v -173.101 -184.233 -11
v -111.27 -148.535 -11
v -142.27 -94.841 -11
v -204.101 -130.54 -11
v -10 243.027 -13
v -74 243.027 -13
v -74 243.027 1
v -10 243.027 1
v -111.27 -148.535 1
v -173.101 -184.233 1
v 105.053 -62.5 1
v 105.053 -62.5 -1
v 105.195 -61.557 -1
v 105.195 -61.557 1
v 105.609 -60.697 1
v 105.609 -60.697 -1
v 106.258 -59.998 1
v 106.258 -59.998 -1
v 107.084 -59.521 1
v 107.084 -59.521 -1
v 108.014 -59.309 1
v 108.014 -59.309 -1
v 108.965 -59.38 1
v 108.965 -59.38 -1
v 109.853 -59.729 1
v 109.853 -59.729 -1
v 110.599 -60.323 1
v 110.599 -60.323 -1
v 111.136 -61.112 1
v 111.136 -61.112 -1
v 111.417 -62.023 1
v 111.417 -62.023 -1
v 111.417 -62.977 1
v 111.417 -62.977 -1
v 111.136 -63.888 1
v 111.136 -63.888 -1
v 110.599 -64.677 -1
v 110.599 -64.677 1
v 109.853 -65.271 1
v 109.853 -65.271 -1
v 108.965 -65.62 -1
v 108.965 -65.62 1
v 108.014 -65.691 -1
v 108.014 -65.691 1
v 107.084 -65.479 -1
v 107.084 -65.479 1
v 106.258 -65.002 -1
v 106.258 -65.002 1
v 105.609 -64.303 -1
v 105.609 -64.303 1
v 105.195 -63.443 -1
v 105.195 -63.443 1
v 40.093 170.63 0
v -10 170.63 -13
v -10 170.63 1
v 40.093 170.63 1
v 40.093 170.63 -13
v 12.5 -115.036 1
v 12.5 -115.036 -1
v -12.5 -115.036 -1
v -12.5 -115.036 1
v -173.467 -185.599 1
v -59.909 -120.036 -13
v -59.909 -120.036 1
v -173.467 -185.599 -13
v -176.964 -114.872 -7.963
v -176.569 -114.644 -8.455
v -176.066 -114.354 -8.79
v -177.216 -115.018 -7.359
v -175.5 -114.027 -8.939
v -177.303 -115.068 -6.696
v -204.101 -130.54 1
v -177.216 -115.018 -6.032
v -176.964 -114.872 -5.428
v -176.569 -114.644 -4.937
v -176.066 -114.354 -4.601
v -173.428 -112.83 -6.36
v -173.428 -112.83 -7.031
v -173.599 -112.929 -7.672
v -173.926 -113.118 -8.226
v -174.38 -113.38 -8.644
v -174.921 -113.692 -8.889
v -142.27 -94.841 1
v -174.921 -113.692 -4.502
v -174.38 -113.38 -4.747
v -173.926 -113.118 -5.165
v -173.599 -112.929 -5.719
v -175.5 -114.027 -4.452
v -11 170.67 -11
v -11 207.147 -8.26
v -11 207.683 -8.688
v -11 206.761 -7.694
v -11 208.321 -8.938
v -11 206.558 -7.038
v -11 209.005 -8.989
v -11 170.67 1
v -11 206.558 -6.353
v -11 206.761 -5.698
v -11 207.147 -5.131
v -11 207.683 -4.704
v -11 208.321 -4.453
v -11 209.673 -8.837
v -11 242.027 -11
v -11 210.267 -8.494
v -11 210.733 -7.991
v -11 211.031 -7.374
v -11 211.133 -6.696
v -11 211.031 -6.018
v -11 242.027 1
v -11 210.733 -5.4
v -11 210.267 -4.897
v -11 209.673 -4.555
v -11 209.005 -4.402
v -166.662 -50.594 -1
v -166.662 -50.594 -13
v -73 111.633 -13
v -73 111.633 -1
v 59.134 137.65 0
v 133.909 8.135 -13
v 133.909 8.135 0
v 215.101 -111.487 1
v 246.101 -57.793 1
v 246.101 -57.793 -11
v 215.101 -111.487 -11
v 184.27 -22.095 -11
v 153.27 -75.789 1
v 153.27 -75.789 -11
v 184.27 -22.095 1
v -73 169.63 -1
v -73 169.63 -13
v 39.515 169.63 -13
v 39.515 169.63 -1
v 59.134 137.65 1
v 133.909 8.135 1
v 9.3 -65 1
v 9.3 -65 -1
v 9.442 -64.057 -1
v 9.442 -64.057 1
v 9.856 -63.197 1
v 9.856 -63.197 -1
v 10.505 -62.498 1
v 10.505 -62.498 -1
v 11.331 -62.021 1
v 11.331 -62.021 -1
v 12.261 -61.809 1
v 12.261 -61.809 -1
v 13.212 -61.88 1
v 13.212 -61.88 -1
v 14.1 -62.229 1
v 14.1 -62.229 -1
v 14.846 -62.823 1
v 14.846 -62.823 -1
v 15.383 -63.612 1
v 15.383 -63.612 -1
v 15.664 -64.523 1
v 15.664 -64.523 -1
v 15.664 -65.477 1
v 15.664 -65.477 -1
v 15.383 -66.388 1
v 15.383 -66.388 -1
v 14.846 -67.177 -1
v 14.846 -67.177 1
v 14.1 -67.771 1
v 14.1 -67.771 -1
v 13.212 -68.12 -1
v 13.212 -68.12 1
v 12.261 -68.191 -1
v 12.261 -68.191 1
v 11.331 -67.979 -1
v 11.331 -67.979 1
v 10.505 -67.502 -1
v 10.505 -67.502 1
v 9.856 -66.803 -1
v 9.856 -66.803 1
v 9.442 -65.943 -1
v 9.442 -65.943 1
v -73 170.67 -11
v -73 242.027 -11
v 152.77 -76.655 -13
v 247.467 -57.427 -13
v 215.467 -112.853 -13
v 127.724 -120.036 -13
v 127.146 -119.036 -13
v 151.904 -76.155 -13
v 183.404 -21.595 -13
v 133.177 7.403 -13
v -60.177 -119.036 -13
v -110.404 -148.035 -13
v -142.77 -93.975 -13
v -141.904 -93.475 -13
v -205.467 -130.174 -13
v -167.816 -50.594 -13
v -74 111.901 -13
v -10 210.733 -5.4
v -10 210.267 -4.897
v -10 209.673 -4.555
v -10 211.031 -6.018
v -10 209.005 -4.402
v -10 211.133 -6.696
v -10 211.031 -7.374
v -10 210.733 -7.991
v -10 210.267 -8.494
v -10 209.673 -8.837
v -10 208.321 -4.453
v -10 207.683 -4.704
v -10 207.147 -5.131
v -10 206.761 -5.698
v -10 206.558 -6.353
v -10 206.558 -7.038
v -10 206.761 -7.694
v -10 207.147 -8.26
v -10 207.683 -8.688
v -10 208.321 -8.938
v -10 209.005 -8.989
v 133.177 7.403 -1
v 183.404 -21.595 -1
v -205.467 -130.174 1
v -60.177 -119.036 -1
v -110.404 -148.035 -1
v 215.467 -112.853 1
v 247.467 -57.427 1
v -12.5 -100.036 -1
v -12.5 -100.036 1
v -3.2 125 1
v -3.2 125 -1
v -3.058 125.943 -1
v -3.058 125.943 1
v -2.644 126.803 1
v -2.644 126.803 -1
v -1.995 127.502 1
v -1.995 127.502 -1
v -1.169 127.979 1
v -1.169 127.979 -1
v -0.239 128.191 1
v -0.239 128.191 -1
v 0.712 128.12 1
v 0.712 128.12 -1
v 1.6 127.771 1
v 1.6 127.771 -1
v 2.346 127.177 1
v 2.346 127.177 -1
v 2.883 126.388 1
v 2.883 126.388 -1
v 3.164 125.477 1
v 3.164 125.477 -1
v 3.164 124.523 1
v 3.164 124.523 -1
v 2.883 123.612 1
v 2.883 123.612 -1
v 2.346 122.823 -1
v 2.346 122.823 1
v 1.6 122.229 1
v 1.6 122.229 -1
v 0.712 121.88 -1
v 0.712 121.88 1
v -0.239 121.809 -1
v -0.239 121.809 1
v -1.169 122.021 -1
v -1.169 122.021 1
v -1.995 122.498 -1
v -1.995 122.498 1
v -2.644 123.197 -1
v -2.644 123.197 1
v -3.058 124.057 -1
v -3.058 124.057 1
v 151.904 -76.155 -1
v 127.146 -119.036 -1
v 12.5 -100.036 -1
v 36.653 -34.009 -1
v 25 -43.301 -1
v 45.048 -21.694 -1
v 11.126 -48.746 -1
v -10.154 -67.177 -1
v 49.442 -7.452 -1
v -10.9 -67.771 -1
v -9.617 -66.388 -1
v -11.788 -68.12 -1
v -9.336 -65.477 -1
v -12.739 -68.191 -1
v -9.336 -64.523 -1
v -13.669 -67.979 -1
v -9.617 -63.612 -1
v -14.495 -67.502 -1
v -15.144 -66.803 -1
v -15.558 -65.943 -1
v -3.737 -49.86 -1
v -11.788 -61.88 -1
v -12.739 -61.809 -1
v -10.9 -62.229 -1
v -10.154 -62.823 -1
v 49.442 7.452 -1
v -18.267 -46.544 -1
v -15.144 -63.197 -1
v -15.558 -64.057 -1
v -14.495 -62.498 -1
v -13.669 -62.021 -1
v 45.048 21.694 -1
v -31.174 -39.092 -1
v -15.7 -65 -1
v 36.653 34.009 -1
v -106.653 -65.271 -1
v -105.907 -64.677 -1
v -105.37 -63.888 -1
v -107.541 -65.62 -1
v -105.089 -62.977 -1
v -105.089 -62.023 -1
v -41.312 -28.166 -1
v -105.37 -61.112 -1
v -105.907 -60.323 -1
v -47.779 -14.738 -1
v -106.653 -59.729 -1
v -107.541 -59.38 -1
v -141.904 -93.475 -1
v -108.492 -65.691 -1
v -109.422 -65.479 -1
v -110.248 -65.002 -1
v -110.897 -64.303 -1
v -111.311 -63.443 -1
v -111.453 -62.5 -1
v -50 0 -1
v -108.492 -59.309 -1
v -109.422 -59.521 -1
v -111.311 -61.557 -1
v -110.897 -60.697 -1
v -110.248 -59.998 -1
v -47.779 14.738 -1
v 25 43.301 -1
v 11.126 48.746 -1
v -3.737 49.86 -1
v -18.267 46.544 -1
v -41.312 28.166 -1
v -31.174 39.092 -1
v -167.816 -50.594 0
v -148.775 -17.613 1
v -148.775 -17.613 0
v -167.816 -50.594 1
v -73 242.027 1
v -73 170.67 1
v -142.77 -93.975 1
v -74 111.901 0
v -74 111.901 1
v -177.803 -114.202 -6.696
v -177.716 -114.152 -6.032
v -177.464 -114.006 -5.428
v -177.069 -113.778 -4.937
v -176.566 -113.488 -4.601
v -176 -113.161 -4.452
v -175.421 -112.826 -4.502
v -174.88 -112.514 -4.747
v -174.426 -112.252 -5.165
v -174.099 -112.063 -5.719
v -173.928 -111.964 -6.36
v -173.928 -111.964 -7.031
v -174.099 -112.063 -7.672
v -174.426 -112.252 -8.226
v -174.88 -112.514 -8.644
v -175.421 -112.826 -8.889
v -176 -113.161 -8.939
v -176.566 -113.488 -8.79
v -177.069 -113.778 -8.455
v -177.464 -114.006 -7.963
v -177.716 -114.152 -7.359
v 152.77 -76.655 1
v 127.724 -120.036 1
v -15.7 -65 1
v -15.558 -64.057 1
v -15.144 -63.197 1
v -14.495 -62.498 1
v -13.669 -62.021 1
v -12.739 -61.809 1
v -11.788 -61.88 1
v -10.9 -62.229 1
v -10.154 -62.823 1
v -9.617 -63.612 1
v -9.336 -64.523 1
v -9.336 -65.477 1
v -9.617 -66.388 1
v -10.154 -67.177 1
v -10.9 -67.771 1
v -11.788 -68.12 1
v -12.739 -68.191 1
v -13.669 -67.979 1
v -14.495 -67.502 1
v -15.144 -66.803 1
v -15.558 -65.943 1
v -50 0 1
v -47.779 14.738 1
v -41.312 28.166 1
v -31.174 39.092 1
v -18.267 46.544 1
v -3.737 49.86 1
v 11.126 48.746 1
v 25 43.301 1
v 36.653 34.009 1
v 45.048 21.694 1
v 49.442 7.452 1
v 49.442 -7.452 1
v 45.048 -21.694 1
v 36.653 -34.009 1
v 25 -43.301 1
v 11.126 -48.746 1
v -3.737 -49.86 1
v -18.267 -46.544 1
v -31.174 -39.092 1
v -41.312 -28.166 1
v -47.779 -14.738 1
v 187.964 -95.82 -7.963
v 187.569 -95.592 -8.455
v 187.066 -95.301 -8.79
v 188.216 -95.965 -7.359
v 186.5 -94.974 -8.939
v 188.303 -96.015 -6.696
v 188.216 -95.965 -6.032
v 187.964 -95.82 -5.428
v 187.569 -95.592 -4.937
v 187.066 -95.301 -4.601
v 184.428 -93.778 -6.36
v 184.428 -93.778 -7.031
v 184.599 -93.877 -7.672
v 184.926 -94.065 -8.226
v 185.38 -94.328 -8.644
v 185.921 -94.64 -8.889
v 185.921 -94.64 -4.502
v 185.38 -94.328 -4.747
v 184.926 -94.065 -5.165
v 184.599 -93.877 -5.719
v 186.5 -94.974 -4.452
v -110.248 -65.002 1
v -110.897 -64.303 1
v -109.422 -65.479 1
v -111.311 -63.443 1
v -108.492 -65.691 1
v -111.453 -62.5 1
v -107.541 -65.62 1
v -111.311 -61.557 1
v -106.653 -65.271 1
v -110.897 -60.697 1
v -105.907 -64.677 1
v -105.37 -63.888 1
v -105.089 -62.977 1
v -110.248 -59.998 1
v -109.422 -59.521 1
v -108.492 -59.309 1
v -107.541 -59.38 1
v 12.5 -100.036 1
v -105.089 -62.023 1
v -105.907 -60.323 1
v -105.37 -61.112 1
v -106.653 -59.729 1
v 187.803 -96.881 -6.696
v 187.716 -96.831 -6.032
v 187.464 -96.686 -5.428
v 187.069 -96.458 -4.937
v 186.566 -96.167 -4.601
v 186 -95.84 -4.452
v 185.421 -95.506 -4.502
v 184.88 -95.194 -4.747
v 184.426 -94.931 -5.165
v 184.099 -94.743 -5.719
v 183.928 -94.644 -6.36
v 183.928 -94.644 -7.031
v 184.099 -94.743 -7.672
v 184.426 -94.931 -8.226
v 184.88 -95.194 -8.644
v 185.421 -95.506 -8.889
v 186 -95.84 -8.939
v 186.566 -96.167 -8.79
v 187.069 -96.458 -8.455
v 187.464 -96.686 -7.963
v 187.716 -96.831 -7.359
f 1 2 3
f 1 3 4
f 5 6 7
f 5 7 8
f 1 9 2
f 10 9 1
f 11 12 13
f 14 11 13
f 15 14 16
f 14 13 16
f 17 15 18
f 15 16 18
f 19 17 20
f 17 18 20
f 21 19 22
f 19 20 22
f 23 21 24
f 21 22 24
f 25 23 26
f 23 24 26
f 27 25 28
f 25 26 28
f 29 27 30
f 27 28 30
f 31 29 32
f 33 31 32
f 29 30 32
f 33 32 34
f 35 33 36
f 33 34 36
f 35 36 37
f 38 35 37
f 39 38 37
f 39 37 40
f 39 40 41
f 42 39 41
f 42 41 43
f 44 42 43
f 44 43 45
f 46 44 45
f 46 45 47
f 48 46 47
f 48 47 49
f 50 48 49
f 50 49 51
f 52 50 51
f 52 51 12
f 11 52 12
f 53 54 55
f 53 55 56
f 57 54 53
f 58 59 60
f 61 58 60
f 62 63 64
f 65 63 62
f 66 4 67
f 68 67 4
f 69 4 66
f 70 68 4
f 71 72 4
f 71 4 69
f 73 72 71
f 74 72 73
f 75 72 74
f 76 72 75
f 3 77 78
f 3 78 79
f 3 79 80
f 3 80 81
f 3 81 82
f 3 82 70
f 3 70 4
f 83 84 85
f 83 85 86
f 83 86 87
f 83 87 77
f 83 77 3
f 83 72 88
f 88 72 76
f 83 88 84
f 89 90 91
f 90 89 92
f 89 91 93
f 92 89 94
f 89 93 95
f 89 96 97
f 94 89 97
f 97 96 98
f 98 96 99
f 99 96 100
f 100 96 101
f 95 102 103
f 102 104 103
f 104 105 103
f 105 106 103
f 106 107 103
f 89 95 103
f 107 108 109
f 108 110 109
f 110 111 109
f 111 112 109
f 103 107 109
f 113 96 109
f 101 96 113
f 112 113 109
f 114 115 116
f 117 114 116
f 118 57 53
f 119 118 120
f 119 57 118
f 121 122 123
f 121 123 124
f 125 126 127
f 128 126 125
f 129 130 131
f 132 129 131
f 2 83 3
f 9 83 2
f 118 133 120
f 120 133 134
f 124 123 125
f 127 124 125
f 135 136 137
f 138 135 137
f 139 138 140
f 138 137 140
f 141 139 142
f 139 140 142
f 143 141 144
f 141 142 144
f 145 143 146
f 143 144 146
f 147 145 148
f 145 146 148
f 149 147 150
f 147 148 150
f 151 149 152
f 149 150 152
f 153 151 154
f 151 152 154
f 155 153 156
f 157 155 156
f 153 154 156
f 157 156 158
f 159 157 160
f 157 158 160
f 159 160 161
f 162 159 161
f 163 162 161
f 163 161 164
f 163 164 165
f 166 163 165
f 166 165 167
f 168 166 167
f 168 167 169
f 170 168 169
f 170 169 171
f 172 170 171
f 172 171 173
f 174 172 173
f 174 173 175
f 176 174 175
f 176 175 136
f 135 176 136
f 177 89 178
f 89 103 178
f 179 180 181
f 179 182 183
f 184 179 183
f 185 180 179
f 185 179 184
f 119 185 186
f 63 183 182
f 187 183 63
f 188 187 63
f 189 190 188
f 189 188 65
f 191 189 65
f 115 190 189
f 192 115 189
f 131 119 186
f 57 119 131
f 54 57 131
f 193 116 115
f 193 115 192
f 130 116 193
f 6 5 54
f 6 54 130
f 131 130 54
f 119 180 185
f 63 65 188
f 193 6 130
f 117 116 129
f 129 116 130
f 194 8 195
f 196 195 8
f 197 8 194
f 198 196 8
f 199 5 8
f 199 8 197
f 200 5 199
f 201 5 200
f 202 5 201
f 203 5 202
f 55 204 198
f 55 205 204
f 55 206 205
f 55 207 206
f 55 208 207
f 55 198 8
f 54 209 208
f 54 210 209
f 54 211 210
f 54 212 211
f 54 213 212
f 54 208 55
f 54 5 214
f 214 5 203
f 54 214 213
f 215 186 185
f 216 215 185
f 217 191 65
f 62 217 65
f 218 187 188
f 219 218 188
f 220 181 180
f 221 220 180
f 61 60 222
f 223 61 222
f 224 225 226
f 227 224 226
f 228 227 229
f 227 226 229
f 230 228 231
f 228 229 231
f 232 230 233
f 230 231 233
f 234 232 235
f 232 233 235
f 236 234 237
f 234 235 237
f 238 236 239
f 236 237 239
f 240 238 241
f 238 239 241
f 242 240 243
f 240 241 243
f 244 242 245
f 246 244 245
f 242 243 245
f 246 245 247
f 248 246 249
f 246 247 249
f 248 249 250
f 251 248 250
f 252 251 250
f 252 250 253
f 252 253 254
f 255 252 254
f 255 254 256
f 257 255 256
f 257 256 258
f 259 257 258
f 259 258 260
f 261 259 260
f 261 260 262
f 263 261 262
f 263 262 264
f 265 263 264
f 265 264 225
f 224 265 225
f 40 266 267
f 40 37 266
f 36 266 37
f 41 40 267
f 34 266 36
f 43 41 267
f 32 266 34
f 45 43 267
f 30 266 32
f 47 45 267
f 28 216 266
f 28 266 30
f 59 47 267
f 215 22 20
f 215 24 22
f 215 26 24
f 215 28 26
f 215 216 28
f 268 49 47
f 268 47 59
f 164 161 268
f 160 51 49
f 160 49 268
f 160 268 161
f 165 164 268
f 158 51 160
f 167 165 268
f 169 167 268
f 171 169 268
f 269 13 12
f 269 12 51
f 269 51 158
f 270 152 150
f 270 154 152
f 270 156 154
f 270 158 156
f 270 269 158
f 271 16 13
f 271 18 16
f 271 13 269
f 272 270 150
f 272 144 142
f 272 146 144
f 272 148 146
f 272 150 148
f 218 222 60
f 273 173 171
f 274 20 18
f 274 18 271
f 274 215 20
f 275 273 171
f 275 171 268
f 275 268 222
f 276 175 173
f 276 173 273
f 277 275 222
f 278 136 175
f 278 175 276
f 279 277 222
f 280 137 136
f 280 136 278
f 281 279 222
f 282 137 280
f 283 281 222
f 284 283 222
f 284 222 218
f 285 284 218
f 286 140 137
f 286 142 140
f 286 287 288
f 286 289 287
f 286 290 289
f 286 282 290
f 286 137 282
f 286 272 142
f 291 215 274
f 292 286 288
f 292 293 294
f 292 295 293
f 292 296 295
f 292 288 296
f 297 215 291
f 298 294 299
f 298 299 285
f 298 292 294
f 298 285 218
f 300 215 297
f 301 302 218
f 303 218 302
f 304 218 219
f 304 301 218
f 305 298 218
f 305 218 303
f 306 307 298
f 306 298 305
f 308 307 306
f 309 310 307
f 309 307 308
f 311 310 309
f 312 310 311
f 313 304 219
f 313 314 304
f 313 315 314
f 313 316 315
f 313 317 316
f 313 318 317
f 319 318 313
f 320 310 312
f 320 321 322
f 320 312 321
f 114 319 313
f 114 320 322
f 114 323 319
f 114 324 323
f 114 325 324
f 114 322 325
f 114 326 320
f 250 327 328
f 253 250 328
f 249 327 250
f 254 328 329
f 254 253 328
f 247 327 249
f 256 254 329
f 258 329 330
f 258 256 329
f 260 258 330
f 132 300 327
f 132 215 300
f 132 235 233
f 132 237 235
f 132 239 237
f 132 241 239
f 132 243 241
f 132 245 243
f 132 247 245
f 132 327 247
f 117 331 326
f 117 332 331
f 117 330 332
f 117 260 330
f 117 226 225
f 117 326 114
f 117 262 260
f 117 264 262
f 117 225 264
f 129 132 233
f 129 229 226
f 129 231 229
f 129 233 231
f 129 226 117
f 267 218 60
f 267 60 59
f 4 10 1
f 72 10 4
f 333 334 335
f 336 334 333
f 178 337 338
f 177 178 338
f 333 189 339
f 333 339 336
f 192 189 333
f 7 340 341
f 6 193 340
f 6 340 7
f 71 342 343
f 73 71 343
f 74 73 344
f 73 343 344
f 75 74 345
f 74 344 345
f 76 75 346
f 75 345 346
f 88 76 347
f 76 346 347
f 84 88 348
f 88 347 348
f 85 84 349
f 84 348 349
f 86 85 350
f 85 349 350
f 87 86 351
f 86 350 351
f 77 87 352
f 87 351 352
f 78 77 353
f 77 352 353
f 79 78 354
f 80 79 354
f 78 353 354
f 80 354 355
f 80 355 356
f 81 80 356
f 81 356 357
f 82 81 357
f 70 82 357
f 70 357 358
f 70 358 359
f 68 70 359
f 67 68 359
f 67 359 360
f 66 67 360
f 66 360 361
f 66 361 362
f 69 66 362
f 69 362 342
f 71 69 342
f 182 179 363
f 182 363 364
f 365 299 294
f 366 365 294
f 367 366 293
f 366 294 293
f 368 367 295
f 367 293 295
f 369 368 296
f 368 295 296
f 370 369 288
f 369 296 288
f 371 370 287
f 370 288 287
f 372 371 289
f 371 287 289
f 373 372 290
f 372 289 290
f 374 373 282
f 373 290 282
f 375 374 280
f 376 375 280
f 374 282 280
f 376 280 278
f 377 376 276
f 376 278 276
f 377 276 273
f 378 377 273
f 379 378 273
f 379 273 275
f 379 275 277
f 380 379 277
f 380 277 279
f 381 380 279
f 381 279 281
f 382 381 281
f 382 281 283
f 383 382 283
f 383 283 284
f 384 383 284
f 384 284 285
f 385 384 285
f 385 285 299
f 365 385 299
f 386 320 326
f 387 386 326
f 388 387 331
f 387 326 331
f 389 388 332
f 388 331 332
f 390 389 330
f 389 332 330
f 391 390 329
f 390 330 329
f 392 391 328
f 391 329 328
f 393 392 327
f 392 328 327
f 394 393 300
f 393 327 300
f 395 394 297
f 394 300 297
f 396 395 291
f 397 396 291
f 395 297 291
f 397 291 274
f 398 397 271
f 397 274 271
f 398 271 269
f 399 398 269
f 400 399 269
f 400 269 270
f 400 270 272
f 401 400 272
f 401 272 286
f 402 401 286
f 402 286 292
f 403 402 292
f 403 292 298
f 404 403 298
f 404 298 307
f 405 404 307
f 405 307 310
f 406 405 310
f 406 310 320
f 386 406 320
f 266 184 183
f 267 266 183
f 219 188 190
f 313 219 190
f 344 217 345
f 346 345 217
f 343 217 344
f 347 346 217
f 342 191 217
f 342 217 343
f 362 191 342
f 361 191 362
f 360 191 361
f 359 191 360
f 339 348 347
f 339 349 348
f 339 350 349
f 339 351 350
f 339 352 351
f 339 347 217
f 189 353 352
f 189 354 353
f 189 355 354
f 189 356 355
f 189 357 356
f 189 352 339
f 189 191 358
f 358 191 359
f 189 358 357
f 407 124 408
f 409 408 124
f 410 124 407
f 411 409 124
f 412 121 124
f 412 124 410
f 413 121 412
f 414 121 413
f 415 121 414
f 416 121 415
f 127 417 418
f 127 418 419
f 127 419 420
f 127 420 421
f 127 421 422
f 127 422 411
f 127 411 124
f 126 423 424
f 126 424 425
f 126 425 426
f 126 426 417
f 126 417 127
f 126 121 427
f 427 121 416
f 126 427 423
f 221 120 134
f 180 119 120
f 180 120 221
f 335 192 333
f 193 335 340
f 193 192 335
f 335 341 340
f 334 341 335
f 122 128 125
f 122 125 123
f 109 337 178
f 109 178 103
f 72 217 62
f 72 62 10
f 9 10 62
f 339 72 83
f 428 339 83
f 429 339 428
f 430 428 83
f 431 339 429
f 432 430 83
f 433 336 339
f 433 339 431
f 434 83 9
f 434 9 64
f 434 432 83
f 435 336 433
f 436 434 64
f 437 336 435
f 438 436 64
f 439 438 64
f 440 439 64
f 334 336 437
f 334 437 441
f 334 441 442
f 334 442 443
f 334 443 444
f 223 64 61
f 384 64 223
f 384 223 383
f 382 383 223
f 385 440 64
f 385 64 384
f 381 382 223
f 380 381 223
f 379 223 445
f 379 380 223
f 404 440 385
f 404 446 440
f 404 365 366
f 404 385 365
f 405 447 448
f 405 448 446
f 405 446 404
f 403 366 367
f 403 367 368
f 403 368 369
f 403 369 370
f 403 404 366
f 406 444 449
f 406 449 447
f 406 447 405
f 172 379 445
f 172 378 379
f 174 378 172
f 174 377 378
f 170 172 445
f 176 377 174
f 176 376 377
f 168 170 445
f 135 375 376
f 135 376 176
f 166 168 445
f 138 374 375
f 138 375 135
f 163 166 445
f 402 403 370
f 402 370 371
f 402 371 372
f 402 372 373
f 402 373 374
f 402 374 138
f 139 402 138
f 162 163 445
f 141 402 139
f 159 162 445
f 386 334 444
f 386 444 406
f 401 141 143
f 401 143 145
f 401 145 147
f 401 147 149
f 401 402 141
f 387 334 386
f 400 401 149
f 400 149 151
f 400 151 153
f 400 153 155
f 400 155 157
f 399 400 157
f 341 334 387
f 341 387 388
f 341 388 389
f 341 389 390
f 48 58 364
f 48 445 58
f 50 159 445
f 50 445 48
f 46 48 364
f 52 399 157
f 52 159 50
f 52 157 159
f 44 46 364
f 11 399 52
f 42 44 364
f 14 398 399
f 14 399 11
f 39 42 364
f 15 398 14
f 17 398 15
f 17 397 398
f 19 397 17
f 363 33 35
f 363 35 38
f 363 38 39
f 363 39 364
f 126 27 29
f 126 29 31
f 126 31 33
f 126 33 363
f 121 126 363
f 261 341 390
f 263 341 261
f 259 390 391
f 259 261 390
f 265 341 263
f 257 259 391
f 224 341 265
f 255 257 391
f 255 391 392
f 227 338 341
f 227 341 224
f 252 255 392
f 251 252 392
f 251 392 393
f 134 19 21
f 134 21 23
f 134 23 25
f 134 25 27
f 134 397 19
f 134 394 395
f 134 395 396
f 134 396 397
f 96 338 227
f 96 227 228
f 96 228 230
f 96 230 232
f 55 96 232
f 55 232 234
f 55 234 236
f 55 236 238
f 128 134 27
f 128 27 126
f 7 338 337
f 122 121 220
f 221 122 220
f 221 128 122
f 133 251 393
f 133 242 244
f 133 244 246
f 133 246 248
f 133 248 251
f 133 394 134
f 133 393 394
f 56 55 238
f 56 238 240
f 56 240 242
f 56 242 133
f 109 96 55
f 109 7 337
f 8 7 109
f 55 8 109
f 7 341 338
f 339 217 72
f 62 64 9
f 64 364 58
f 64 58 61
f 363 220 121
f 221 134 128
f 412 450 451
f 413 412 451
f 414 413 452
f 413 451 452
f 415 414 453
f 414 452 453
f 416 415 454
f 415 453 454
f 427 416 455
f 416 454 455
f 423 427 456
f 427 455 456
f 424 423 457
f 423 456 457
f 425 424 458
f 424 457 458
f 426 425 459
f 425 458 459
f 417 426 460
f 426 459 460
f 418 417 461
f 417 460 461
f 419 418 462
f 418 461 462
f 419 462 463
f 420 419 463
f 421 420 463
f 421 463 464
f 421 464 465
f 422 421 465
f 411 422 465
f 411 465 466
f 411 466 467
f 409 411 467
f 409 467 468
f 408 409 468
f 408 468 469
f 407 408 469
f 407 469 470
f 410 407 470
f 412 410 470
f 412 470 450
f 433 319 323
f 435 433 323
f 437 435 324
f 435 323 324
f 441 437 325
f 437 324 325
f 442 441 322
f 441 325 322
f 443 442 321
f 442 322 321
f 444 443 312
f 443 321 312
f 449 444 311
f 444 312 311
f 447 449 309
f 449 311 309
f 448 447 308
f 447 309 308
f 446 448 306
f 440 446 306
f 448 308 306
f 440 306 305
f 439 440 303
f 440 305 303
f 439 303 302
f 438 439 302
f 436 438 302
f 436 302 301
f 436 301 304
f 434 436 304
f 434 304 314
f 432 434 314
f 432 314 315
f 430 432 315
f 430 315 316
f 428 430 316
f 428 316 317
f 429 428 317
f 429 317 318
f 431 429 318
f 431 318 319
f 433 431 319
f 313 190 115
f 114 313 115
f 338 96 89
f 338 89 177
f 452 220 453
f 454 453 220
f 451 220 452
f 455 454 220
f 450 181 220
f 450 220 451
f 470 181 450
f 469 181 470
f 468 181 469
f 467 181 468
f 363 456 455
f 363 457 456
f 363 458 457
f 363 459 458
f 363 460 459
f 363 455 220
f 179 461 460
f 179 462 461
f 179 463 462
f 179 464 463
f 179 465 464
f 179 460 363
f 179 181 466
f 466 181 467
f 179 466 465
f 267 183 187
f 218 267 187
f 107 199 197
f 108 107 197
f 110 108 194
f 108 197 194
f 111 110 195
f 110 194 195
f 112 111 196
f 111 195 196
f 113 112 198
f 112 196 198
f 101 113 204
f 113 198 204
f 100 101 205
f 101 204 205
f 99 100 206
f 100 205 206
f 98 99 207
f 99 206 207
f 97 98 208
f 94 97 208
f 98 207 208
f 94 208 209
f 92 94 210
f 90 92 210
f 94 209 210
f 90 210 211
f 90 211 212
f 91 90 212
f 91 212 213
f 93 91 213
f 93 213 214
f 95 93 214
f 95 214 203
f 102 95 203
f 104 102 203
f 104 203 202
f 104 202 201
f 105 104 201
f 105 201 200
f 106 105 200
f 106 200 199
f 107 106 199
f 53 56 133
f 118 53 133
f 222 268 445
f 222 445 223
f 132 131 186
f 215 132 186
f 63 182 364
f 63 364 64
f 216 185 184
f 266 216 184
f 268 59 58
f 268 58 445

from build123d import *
from build123d.topology import SkipClean

# Parameters (mm, degrees)
SKETCH_1_R           = 255
EXTRUDE_1_DEPTH      = 1
CUT_EXTRUDE_1_DEPTH  = 361.625844886
EXTRUDE_START        = 13
EXTRUDE_3_DEPTH      = 13
CUT_EXTRUDE_6_DEPTH  = 12
SKETCH_9_R           = 50
CUT_EXTRUDE_7_DEPTH  = 14
CUT_EXTRUDE_START    = -24
CUT_EXTRUDE_8_DEPTH  = 24
CUT_EXTRUDE_9_DEPTH  = 12
SKETCH_12_R          = 3.2
CUT_EXTRUDE_10_DEPTH = 10
SKETCH_13_R          = 3.2
CUT_EXTRUDE_11_DEPTH = 10
SKETCH_14_R          = 2.25
CUT_EXTRUDE_12_DEPTH = 10
SKETCH_16_R          = 2.3
CUT_EXTRUDE_13_DEPTH = 10
SKETCH_15_R          = 2.25
CUT_EXTRUDE_14_DEPTH = 10
SKETCH_17_W          = 25
SKETCH_17_H          = 15
CUT_EXTRUDE_15_DEPTH = 4.5


with BuildPart() as part:
    # 草图1 → 拉伸1 (new body)
    with BuildSketch(Plane.XY):
        Circle(SKETCH_1_R)
    extrude(amount=EXTRUDE_1_DEPTH)

    # 草图2 → 切除-拉伸1 (cut, through all)
    with BuildSketch(Plane.XY.offset(1)):
        with BuildLine():
            Line((-74, 244.02663789), (-74, 111.900834456))
            Line((-74, 111.900834456), (-148.774990748, -17.613248654))
            Line((-148.774990748, -17.613248654), (-167.81626488, -50.593702892))
            Line((-167.81626488, -50.593702892), (-142.769914648, -93.975254038))
            Line((-142.769914648, -93.975254038), (-215.666603726, -136.0621771))
            ThreePointArc((-215.666603726, -136.0621771), (-238.942591743, 89.058620308), (-74, 244.02663789))
        make_face()
        with BuildLine():
            Line((133.908965344, 8.135462652), (248.333267613, -57.927439065))
            ThreePointArc((248.333267613, -57.927439065), (196.598323484, 162.401044341), (-10, 254.803846125))
            Line((-10, 254.803846125), (-10, 170.63))
            Line((-10, 170.63), (40.092700464, 170.63))
            Line((40.092700464, 170.63), (59.133974596, 137.649545762))
            Line((59.133974596, 137.649545762), (133.908965344, 8.135462652))
        make_face()
        with BuildLine():
            Line((-174.333267613, -186.099198825), (-59.908965344, -120.036297108))
            Line((-59.908965344, -120.036297108), (89.641016151, -120.036297108))
            Line((89.641016151, -120.036297108), (127.723564416, -120.036297108))
            Line((127.723564416, -120.036297108), (152.769914648, -76.654745962))
            Line((152.769914648, -76.654745962), (225.666603726, -118.741669025))
            ThreePointArc((225.666603726, -118.741669025), (42.344268258, -251.45966465), (-174.333267613, -186.099198825))
        make_face()
    extrude(amount=-CUT_EXTRUDE_1_DEPTH, mode=Mode.SUBTRACT)

    # 草图7 → 拉伸3 (add)
    with BuildSketch(Plane(origin=(0, 0, 0), x_dir=(-1, 0, 0), z_dir=(0, 0, -1)).offset(EXTRUDE_START)):
        with BuildLine():
            Line((-133.908965344, 8.135462652), (-248.333267613, -57.927439065))
            ThreePointArc((-248.333267613, -57.927439065), (-238.942591743, -89.058620308), (-225.666603726, -118.741669025))
            Line((-225.666603726, -118.741669025), (-152.769914648, -76.654745962))
            Line((-152.769914648, -76.654745962), (-127.723564416, -120.036297108))
            Line((-127.723564416, -120.036297108), (59.908965344, -120.036297108))
            Line((59.908965344, -120.036297108), (174.333267613, -186.099198825))
            ThreePointArc((174.333267613, -186.099198825), (196.598323484, -162.401044341), (215.666603726, -136.0621771))
            Line((215.666603726, -136.0621771), (142.769914648, -93.975254038))
            Line((142.769914648, -93.975254038), (167.81626488, -50.593702892))
            Line((167.81626488, -50.593702892), (74, 111.900834456))
            Line((74, 111.900834456), (74, 244.02663789))
            ThreePointArc((74, 244.02663789), (42.344268258, 251.45966465), (10, 254.803846125))
            Line((10, 254.803846125), (10, 170.63))
            Line((10, 170.63), (-40.092700464, 170.63))
            Line((-40.092700464, 170.63), (-133.908965344, 8.135462652))
        make_face()
    extrude(amount=-EXTRUDE_3_DEPTH)

    # 草图8 → 切除-拉伸6 (cut)
    with SkipClean():  # the faces are left unmerged after this step: merging them gives an invalid solid
        with BuildSketch(Plane(origin=(0, 0, -13), x_dir=(-1, 0, 0), z_dir=(0, 0, -1))):
            Polygon((-39.515350195, 169.63), (-133.176914536, 7.403411844), (-183.403889244, -21.595145524), (-151.903889244, -76.154745962), (-127.146214147, -119.036297108), (60.176914536, -119.036297108), (110.403889244, -148.034854476), (141.903889244, -93.475254038), (166.661564341, -50.593702892), (73, 111.632885264), (73, 169.63), (10, 169.63), align=None)
        extrude(amount=-CUT_EXTRUDE_6_DEPTH, mode=Mode.SUBTRACT)

    # 草图9 → 切除-拉伸7 (cut)
    with SkipClean():  # the faces are left unmerged after this step: merging them gives an invalid solid
        with BuildSketch(Plane(origin=(0, 0, -1), x_dir=(-1, 0, 0), z_dir=(0, 0, -1))):
            Circle(SKETCH_9_R)
        extrude(amount=-CUT_EXTRUDE_7_DEPTH, mode=Mode.SUBTRACT)

    # 草图10 → 切除-拉伸8 (cut)
    with BuildSketch(Plane.XY.offset(1).offset(CUT_EXTRUDE_START)):
        with BuildLine():
            Line((225.666603726, -118.741669025), (215.467242209, -112.853064907))
            Line((215.467242209, -112.853064907), (247.467242209, -57.427439065))
            Line((247.467242209, -57.427439065), (248.333267613, -57.927439065))
            ThreePointArc((248.333267613, -57.927439065), (238.942591743, -89.058620308), (225.666603726, -118.741669025))
        make_face()
        with BuildLine():
            Line((-74, 243.02663789), (-10, 243.02663789))
            Line((-10, 243.02663789), (-10, 254.803846125))
            ThreePointArc((-10, 254.803846125), (-42.344268258, 251.45966465), (-74, 244.02663789))
            Line((-74, 244.02663789), (-74, 243.02663789))
        make_face()
        with BuildLine():
            Line((-215.666603726, -136.0621771), (-205.467242209, -130.173572983))
            Line((-205.467242209, -130.173572983), (-173.467242209, -185.599198825))
            Line((-173.467242209, -185.599198825), (-174.333267613, -186.099198825))
            ThreePointArc((-174.333267613, -186.099198825), (-196.598323484, -162.401044341), (-215.666603726, -136.0621771))
        make_face()
    extrude(amount=CUT_EXTRUDE_8_DEPTH, mode=Mode.SUBTRACT)

    # 草图11 → 切除-拉伸9 (cut)
    with BuildSketch(Plane.XY.offset(1)):
        Polygon((-11, 170.669617313), (-73, 170.669617313), (-73, 171.63), (-73, 242.02663789), (-11, 242.02663789), (-11, 171.63), align=None)
        Polygon((153.269914648, -75.788720558), (184.269914648, -22.095145524), (246.101216805, -57.793464469), (215.101216805, -111.487039503), align=None)
        Polygon((-173.101216805, -184.233173421), (-204.101216805, -130.539598387), (-142.269914648, -94.841279442), (-111.269914648, -148.534854476), align=None)
    extrude(amount=-CUT_EXTRUDE_9_DEPTH, mode=Mode.SUBTRACT)

    # 草图12 → 切除-拉伸10 (cut)
    with BuildSketch(Plane(origin=(0, 0, -1), x_dir=(-1, 0, 0), z_dir=(0, 0, -1))):
        with Locations((-12.5, -65)):
            Circle(SKETCH_12_R)
        with Locations((12.5, -65)):
            Circle(SKETCH_12_R)
    extrude(amount=-CUT_EXTRUDE_10_DEPTH, mode=Mode.SUBTRACT)

    # 草图13 → 切除-拉伸11 (cut)
    with BuildSketch(Plane(origin=(0, 0, -1), x_dir=(-1, 0, 0), z_dir=(0, 0, -1))):
        with Locations((0, 125)):
            Circle(SKETCH_13_R)
        with Locations((108.253175473, -62.5)):
            Circle(SKETCH_13_R)
        with Locations((-108.253175473, -62.5)):
            Circle(SKETCH_13_R)
    extrude(amount=-CUT_EXTRUDE_11_DEPTH, mode=Mode.SUBTRACT)

    # 草图14 → 切除-拉伸12 (cut)
    with BuildSketch(Plane(origin=(5, -8.660254038, 0), x_dir=(-0.8660254037844386, -0.5000000000000001, 0), z_dir=(-0.5000000000000001, 0.8660254037844386, 0))):
        with Locations((208.832756681, -6.69566134)):
            Circle(SKETCH_14_R)
    extrude(amount=-CUT_EXTRUDE_12_DEPTH, mode=Mode.SUBTRACT)

    # 草图16 → 切除-拉伸13 (cut)
    with BuildSketch(Plane(origin=(-10, 0, 0), x_dir=(0, 0, -1), z_dir=(1, 0, 0))):
        with Locations(Location((6.69566134, 208.832756681, 0), (0, 0, 90))):
            Circle(SKETCH_16_R)
    extrude(amount=-CUT_EXTRUDE_13_DEPTH, mode=Mode.SUBTRACT)

    # 草图15 → 切除-拉伸14 (cut)
    with BuildSketch(Plane(origin=(5, 8.660254038, 0), x_dir=(0.8660254037844386, -0.5, 0), z_dir=(-0.5000000000000001, -0.8660254037844387, 0))):
        with Locations((208.832756681, -6.69566134)):
            Circle(SKETCH_15_R)
    extrude(amount=-CUT_EXTRUDE_14_DEPTH, mode=Mode.SUBTRACT)

    # 草图17 → 切除-拉伸15 (cut)
    with BuildSketch(Plane(origin=(0, 0, -1), x_dir=(-1, 0, 0), z_dir=(0, 0, -1))):
        with Locations((0, -107.536297108)):
            Rectangle(SKETCH_17_W, SKETCH_17_H)
    extrude(amount=-CUT_EXTRUDE_15_DEPTH, mode=Mode.SUBTRACT)


solid = part.part
